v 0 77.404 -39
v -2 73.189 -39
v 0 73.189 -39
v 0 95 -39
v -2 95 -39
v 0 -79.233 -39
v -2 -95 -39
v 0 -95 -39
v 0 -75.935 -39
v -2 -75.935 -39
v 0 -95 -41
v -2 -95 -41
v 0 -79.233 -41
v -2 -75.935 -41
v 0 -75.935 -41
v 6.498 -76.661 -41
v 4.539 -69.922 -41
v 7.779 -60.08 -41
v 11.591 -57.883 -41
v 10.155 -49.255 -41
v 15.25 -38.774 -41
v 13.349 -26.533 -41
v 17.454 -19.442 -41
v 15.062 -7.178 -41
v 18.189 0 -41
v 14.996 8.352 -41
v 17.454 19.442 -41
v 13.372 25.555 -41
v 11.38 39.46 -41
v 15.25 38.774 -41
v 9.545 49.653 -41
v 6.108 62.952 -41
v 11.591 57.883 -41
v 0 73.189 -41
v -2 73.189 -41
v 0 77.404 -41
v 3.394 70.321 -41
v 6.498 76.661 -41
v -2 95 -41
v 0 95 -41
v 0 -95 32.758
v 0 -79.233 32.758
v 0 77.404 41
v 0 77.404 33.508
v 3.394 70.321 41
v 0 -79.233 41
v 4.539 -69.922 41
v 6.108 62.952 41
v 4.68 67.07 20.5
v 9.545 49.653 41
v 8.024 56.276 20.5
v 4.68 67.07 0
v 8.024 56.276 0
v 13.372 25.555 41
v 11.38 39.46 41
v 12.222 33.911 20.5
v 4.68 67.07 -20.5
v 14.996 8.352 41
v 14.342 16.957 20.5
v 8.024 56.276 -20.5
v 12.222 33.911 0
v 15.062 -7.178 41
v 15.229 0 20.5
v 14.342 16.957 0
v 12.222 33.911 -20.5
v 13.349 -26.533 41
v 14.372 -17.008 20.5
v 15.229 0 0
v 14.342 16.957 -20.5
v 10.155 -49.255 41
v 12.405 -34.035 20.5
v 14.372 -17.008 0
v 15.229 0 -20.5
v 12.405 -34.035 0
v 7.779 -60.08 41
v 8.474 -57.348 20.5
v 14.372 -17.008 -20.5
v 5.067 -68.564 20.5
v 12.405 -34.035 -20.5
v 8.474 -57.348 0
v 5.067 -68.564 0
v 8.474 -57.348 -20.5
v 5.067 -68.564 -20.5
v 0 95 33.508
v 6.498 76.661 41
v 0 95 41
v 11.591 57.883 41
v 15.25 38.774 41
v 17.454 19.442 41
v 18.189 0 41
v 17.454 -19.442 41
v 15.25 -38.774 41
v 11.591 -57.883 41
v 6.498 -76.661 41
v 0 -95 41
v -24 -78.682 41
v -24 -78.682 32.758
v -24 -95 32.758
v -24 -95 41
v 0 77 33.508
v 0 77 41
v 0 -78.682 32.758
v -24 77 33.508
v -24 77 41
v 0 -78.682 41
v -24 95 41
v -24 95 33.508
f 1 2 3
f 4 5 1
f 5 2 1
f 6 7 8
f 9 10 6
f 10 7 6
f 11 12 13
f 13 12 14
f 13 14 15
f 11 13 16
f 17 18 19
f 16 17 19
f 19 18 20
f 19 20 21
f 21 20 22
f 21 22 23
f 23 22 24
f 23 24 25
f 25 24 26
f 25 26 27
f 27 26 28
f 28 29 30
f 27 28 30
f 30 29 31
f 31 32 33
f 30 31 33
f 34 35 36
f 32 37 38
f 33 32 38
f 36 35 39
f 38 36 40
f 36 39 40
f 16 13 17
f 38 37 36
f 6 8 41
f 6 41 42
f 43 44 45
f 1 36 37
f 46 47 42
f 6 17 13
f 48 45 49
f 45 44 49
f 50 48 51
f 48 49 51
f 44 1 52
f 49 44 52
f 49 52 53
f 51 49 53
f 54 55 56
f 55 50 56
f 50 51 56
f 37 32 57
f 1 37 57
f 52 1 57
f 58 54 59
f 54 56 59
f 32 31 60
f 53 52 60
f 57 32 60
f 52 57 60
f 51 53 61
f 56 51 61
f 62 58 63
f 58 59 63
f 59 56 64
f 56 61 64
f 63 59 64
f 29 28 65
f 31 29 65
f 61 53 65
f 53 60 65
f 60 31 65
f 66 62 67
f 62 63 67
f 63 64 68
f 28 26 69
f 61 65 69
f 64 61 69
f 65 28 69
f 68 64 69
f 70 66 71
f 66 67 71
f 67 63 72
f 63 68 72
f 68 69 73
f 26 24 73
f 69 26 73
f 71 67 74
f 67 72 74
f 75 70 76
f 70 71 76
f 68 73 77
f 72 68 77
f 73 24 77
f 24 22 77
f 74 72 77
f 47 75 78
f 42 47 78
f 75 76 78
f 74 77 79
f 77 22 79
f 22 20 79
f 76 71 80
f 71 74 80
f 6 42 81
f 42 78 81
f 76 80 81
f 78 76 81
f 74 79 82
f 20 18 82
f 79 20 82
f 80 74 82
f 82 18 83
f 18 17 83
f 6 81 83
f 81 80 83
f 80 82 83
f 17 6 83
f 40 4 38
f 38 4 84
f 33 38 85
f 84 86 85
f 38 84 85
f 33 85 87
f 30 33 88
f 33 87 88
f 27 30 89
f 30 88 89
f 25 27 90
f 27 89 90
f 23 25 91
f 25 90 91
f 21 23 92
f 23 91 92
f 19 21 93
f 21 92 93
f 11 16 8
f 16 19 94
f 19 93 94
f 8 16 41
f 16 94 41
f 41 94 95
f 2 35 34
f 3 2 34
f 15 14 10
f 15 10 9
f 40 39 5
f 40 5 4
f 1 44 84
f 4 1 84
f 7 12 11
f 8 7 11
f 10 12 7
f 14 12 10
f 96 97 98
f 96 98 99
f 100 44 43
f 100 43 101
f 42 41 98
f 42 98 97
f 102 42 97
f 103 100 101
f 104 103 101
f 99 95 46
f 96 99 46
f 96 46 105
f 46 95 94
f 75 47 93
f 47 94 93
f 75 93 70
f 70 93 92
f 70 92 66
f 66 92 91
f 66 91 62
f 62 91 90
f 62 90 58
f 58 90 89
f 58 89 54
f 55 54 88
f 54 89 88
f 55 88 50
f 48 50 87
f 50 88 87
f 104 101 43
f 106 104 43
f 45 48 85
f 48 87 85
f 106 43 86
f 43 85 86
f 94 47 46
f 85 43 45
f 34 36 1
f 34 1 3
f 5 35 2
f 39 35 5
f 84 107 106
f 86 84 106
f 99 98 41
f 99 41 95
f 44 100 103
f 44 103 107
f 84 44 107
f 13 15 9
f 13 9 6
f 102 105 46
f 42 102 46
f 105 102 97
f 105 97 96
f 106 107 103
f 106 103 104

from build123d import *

# Parameters (mm, degrees)
BOSS_EXTRUDE2_DEPTH     = 41
CUT_EXTRUDE1_DEPTH      = 106.056446042
CUT_EXTRUDE1_DEPTH_BACK = 106.056446042
SKETCH7_W               = 7.491980345
SKETCH7_H               = 18
BOSS_EXTRUDE3_DEPTH     = 24
SKETCH9_W               = 8.241980345
SKETCH9_H               = 16.318258018
BOSS_EXTRUDE4_DEPTH     = 24
SKETCH15_W              = 2
SKETCH15_H              = 21.810875259
BOSS_EXTRUDE6_DEPTH     = 2
SKETCH16_W              = 2
SKETCH16_H              = 19.064566639
BOSS_EXTRUDE7_DEPTH     = 2
CUT_EXTRUDE2_DEPTH      = 107.216759506
CUT_EXTRUDE2_DEPTH_BACK = 107.216759506


with BuildPart() as part:
    # Sketch5 → Boss-Extrude2 (new, symmetric)
    with BuildSketch(Plane.XY):
        with BuildLine():
            Line((0, -95), (0, 95))
            ThreePointArc((0, 95), (18.189470994, 0), (0, -95))
        make_face()
    extrude(amount=BOSS_EXTRUDE2_DEPTH, both=True)

    # Sketch6 → Cut-Extrude1 (cut, two sides: drawn at the far end of the back side and taken through both)
    with BuildSketch(Plane.XY.offset(-CUT_EXTRUDE1_DEPTH_BACK)):
        with BuildLine():
            Line((0, 73.189124741), (0, -75.935433361))
            ThreePointArc((0, -75.935433361), (11.848694319, -1.37315431), (0, 73.189124741))
        make_face()
    extrude(amount=CUT_EXTRUDE1_DEPTH + CUT_EXTRUDE1_DEPTH_BACK, mode=Mode.SUBTRACT)

    # Sketch7 → Boss-Extrude3 (add)
    with BuildSketch(Plane.ZY):
        with Locations((37.254009827, 86)):
            Rectangle(SKETCH7_W, SKETCH7_H)
    extrude(amount=BOSS_EXTRUDE3_DEPTH)

    # Sketch9 → Boss-Extrude4 (add)
    with BuildSketch(Plane.ZY):
        with Locations((36.879009827, -86.840870991)):
            Rectangle(SKETCH9_W, SKETCH9_H)
    extrude(amount=BOSS_EXTRUDE4_DEPTH)

    # Sketch15 → Boss-Extrude6 (add)
    with BuildSketch(Plane.XY.offset(-41)):
        with Locations((-1, 84.094562371)):
            Rectangle(SKETCH15_W, SKETCH15_H)
    extrude(amount=BOSS_EXTRUDE6_DEPTH)

    # Sketch16 → Boss-Extrude7 (add)
    with BuildSketch(Plane.XY.offset(-41)):
        with Locations((-1, -85.467716681)):
            Rectangle(SKETCH16_W, SKETCH16_H)
    extrude(amount=BOSS_EXTRUDE7_DEPTH)

    # Sketch18 → Cut-Extrude2 (cut, two sides: drawn at the far end of the back side and taken through both)
    with BuildSketch(Plane.XY.offset(-CUT_EXTRUDE2_DEPTH_BACK)):
        with BuildLine():
            Line((0, 77.403954958), (0, -79.233152756))
            add(Edge.make_bspline(
                [(0, 77.403954958), (7.29967651, 63.999105608), (12.069881817, 37.679146823), (16.580904834, -0.041757284), (12.014730591, -38.310384751), (8.094731037, -65.45608458), (0, -79.233152756)],
                knots=[0, 0, 0, 0, 0.282270796, 0.494146488, 0.70668985, 1, 1, 1, 1], degree=3))
        make_face()
    extrude(amount=CUT_EXTRUDE2_DEPTH + CUT_EXTRUDE2_DEPTH_BACK, mode=Mode.SUBTRACT)


solid = part.part
